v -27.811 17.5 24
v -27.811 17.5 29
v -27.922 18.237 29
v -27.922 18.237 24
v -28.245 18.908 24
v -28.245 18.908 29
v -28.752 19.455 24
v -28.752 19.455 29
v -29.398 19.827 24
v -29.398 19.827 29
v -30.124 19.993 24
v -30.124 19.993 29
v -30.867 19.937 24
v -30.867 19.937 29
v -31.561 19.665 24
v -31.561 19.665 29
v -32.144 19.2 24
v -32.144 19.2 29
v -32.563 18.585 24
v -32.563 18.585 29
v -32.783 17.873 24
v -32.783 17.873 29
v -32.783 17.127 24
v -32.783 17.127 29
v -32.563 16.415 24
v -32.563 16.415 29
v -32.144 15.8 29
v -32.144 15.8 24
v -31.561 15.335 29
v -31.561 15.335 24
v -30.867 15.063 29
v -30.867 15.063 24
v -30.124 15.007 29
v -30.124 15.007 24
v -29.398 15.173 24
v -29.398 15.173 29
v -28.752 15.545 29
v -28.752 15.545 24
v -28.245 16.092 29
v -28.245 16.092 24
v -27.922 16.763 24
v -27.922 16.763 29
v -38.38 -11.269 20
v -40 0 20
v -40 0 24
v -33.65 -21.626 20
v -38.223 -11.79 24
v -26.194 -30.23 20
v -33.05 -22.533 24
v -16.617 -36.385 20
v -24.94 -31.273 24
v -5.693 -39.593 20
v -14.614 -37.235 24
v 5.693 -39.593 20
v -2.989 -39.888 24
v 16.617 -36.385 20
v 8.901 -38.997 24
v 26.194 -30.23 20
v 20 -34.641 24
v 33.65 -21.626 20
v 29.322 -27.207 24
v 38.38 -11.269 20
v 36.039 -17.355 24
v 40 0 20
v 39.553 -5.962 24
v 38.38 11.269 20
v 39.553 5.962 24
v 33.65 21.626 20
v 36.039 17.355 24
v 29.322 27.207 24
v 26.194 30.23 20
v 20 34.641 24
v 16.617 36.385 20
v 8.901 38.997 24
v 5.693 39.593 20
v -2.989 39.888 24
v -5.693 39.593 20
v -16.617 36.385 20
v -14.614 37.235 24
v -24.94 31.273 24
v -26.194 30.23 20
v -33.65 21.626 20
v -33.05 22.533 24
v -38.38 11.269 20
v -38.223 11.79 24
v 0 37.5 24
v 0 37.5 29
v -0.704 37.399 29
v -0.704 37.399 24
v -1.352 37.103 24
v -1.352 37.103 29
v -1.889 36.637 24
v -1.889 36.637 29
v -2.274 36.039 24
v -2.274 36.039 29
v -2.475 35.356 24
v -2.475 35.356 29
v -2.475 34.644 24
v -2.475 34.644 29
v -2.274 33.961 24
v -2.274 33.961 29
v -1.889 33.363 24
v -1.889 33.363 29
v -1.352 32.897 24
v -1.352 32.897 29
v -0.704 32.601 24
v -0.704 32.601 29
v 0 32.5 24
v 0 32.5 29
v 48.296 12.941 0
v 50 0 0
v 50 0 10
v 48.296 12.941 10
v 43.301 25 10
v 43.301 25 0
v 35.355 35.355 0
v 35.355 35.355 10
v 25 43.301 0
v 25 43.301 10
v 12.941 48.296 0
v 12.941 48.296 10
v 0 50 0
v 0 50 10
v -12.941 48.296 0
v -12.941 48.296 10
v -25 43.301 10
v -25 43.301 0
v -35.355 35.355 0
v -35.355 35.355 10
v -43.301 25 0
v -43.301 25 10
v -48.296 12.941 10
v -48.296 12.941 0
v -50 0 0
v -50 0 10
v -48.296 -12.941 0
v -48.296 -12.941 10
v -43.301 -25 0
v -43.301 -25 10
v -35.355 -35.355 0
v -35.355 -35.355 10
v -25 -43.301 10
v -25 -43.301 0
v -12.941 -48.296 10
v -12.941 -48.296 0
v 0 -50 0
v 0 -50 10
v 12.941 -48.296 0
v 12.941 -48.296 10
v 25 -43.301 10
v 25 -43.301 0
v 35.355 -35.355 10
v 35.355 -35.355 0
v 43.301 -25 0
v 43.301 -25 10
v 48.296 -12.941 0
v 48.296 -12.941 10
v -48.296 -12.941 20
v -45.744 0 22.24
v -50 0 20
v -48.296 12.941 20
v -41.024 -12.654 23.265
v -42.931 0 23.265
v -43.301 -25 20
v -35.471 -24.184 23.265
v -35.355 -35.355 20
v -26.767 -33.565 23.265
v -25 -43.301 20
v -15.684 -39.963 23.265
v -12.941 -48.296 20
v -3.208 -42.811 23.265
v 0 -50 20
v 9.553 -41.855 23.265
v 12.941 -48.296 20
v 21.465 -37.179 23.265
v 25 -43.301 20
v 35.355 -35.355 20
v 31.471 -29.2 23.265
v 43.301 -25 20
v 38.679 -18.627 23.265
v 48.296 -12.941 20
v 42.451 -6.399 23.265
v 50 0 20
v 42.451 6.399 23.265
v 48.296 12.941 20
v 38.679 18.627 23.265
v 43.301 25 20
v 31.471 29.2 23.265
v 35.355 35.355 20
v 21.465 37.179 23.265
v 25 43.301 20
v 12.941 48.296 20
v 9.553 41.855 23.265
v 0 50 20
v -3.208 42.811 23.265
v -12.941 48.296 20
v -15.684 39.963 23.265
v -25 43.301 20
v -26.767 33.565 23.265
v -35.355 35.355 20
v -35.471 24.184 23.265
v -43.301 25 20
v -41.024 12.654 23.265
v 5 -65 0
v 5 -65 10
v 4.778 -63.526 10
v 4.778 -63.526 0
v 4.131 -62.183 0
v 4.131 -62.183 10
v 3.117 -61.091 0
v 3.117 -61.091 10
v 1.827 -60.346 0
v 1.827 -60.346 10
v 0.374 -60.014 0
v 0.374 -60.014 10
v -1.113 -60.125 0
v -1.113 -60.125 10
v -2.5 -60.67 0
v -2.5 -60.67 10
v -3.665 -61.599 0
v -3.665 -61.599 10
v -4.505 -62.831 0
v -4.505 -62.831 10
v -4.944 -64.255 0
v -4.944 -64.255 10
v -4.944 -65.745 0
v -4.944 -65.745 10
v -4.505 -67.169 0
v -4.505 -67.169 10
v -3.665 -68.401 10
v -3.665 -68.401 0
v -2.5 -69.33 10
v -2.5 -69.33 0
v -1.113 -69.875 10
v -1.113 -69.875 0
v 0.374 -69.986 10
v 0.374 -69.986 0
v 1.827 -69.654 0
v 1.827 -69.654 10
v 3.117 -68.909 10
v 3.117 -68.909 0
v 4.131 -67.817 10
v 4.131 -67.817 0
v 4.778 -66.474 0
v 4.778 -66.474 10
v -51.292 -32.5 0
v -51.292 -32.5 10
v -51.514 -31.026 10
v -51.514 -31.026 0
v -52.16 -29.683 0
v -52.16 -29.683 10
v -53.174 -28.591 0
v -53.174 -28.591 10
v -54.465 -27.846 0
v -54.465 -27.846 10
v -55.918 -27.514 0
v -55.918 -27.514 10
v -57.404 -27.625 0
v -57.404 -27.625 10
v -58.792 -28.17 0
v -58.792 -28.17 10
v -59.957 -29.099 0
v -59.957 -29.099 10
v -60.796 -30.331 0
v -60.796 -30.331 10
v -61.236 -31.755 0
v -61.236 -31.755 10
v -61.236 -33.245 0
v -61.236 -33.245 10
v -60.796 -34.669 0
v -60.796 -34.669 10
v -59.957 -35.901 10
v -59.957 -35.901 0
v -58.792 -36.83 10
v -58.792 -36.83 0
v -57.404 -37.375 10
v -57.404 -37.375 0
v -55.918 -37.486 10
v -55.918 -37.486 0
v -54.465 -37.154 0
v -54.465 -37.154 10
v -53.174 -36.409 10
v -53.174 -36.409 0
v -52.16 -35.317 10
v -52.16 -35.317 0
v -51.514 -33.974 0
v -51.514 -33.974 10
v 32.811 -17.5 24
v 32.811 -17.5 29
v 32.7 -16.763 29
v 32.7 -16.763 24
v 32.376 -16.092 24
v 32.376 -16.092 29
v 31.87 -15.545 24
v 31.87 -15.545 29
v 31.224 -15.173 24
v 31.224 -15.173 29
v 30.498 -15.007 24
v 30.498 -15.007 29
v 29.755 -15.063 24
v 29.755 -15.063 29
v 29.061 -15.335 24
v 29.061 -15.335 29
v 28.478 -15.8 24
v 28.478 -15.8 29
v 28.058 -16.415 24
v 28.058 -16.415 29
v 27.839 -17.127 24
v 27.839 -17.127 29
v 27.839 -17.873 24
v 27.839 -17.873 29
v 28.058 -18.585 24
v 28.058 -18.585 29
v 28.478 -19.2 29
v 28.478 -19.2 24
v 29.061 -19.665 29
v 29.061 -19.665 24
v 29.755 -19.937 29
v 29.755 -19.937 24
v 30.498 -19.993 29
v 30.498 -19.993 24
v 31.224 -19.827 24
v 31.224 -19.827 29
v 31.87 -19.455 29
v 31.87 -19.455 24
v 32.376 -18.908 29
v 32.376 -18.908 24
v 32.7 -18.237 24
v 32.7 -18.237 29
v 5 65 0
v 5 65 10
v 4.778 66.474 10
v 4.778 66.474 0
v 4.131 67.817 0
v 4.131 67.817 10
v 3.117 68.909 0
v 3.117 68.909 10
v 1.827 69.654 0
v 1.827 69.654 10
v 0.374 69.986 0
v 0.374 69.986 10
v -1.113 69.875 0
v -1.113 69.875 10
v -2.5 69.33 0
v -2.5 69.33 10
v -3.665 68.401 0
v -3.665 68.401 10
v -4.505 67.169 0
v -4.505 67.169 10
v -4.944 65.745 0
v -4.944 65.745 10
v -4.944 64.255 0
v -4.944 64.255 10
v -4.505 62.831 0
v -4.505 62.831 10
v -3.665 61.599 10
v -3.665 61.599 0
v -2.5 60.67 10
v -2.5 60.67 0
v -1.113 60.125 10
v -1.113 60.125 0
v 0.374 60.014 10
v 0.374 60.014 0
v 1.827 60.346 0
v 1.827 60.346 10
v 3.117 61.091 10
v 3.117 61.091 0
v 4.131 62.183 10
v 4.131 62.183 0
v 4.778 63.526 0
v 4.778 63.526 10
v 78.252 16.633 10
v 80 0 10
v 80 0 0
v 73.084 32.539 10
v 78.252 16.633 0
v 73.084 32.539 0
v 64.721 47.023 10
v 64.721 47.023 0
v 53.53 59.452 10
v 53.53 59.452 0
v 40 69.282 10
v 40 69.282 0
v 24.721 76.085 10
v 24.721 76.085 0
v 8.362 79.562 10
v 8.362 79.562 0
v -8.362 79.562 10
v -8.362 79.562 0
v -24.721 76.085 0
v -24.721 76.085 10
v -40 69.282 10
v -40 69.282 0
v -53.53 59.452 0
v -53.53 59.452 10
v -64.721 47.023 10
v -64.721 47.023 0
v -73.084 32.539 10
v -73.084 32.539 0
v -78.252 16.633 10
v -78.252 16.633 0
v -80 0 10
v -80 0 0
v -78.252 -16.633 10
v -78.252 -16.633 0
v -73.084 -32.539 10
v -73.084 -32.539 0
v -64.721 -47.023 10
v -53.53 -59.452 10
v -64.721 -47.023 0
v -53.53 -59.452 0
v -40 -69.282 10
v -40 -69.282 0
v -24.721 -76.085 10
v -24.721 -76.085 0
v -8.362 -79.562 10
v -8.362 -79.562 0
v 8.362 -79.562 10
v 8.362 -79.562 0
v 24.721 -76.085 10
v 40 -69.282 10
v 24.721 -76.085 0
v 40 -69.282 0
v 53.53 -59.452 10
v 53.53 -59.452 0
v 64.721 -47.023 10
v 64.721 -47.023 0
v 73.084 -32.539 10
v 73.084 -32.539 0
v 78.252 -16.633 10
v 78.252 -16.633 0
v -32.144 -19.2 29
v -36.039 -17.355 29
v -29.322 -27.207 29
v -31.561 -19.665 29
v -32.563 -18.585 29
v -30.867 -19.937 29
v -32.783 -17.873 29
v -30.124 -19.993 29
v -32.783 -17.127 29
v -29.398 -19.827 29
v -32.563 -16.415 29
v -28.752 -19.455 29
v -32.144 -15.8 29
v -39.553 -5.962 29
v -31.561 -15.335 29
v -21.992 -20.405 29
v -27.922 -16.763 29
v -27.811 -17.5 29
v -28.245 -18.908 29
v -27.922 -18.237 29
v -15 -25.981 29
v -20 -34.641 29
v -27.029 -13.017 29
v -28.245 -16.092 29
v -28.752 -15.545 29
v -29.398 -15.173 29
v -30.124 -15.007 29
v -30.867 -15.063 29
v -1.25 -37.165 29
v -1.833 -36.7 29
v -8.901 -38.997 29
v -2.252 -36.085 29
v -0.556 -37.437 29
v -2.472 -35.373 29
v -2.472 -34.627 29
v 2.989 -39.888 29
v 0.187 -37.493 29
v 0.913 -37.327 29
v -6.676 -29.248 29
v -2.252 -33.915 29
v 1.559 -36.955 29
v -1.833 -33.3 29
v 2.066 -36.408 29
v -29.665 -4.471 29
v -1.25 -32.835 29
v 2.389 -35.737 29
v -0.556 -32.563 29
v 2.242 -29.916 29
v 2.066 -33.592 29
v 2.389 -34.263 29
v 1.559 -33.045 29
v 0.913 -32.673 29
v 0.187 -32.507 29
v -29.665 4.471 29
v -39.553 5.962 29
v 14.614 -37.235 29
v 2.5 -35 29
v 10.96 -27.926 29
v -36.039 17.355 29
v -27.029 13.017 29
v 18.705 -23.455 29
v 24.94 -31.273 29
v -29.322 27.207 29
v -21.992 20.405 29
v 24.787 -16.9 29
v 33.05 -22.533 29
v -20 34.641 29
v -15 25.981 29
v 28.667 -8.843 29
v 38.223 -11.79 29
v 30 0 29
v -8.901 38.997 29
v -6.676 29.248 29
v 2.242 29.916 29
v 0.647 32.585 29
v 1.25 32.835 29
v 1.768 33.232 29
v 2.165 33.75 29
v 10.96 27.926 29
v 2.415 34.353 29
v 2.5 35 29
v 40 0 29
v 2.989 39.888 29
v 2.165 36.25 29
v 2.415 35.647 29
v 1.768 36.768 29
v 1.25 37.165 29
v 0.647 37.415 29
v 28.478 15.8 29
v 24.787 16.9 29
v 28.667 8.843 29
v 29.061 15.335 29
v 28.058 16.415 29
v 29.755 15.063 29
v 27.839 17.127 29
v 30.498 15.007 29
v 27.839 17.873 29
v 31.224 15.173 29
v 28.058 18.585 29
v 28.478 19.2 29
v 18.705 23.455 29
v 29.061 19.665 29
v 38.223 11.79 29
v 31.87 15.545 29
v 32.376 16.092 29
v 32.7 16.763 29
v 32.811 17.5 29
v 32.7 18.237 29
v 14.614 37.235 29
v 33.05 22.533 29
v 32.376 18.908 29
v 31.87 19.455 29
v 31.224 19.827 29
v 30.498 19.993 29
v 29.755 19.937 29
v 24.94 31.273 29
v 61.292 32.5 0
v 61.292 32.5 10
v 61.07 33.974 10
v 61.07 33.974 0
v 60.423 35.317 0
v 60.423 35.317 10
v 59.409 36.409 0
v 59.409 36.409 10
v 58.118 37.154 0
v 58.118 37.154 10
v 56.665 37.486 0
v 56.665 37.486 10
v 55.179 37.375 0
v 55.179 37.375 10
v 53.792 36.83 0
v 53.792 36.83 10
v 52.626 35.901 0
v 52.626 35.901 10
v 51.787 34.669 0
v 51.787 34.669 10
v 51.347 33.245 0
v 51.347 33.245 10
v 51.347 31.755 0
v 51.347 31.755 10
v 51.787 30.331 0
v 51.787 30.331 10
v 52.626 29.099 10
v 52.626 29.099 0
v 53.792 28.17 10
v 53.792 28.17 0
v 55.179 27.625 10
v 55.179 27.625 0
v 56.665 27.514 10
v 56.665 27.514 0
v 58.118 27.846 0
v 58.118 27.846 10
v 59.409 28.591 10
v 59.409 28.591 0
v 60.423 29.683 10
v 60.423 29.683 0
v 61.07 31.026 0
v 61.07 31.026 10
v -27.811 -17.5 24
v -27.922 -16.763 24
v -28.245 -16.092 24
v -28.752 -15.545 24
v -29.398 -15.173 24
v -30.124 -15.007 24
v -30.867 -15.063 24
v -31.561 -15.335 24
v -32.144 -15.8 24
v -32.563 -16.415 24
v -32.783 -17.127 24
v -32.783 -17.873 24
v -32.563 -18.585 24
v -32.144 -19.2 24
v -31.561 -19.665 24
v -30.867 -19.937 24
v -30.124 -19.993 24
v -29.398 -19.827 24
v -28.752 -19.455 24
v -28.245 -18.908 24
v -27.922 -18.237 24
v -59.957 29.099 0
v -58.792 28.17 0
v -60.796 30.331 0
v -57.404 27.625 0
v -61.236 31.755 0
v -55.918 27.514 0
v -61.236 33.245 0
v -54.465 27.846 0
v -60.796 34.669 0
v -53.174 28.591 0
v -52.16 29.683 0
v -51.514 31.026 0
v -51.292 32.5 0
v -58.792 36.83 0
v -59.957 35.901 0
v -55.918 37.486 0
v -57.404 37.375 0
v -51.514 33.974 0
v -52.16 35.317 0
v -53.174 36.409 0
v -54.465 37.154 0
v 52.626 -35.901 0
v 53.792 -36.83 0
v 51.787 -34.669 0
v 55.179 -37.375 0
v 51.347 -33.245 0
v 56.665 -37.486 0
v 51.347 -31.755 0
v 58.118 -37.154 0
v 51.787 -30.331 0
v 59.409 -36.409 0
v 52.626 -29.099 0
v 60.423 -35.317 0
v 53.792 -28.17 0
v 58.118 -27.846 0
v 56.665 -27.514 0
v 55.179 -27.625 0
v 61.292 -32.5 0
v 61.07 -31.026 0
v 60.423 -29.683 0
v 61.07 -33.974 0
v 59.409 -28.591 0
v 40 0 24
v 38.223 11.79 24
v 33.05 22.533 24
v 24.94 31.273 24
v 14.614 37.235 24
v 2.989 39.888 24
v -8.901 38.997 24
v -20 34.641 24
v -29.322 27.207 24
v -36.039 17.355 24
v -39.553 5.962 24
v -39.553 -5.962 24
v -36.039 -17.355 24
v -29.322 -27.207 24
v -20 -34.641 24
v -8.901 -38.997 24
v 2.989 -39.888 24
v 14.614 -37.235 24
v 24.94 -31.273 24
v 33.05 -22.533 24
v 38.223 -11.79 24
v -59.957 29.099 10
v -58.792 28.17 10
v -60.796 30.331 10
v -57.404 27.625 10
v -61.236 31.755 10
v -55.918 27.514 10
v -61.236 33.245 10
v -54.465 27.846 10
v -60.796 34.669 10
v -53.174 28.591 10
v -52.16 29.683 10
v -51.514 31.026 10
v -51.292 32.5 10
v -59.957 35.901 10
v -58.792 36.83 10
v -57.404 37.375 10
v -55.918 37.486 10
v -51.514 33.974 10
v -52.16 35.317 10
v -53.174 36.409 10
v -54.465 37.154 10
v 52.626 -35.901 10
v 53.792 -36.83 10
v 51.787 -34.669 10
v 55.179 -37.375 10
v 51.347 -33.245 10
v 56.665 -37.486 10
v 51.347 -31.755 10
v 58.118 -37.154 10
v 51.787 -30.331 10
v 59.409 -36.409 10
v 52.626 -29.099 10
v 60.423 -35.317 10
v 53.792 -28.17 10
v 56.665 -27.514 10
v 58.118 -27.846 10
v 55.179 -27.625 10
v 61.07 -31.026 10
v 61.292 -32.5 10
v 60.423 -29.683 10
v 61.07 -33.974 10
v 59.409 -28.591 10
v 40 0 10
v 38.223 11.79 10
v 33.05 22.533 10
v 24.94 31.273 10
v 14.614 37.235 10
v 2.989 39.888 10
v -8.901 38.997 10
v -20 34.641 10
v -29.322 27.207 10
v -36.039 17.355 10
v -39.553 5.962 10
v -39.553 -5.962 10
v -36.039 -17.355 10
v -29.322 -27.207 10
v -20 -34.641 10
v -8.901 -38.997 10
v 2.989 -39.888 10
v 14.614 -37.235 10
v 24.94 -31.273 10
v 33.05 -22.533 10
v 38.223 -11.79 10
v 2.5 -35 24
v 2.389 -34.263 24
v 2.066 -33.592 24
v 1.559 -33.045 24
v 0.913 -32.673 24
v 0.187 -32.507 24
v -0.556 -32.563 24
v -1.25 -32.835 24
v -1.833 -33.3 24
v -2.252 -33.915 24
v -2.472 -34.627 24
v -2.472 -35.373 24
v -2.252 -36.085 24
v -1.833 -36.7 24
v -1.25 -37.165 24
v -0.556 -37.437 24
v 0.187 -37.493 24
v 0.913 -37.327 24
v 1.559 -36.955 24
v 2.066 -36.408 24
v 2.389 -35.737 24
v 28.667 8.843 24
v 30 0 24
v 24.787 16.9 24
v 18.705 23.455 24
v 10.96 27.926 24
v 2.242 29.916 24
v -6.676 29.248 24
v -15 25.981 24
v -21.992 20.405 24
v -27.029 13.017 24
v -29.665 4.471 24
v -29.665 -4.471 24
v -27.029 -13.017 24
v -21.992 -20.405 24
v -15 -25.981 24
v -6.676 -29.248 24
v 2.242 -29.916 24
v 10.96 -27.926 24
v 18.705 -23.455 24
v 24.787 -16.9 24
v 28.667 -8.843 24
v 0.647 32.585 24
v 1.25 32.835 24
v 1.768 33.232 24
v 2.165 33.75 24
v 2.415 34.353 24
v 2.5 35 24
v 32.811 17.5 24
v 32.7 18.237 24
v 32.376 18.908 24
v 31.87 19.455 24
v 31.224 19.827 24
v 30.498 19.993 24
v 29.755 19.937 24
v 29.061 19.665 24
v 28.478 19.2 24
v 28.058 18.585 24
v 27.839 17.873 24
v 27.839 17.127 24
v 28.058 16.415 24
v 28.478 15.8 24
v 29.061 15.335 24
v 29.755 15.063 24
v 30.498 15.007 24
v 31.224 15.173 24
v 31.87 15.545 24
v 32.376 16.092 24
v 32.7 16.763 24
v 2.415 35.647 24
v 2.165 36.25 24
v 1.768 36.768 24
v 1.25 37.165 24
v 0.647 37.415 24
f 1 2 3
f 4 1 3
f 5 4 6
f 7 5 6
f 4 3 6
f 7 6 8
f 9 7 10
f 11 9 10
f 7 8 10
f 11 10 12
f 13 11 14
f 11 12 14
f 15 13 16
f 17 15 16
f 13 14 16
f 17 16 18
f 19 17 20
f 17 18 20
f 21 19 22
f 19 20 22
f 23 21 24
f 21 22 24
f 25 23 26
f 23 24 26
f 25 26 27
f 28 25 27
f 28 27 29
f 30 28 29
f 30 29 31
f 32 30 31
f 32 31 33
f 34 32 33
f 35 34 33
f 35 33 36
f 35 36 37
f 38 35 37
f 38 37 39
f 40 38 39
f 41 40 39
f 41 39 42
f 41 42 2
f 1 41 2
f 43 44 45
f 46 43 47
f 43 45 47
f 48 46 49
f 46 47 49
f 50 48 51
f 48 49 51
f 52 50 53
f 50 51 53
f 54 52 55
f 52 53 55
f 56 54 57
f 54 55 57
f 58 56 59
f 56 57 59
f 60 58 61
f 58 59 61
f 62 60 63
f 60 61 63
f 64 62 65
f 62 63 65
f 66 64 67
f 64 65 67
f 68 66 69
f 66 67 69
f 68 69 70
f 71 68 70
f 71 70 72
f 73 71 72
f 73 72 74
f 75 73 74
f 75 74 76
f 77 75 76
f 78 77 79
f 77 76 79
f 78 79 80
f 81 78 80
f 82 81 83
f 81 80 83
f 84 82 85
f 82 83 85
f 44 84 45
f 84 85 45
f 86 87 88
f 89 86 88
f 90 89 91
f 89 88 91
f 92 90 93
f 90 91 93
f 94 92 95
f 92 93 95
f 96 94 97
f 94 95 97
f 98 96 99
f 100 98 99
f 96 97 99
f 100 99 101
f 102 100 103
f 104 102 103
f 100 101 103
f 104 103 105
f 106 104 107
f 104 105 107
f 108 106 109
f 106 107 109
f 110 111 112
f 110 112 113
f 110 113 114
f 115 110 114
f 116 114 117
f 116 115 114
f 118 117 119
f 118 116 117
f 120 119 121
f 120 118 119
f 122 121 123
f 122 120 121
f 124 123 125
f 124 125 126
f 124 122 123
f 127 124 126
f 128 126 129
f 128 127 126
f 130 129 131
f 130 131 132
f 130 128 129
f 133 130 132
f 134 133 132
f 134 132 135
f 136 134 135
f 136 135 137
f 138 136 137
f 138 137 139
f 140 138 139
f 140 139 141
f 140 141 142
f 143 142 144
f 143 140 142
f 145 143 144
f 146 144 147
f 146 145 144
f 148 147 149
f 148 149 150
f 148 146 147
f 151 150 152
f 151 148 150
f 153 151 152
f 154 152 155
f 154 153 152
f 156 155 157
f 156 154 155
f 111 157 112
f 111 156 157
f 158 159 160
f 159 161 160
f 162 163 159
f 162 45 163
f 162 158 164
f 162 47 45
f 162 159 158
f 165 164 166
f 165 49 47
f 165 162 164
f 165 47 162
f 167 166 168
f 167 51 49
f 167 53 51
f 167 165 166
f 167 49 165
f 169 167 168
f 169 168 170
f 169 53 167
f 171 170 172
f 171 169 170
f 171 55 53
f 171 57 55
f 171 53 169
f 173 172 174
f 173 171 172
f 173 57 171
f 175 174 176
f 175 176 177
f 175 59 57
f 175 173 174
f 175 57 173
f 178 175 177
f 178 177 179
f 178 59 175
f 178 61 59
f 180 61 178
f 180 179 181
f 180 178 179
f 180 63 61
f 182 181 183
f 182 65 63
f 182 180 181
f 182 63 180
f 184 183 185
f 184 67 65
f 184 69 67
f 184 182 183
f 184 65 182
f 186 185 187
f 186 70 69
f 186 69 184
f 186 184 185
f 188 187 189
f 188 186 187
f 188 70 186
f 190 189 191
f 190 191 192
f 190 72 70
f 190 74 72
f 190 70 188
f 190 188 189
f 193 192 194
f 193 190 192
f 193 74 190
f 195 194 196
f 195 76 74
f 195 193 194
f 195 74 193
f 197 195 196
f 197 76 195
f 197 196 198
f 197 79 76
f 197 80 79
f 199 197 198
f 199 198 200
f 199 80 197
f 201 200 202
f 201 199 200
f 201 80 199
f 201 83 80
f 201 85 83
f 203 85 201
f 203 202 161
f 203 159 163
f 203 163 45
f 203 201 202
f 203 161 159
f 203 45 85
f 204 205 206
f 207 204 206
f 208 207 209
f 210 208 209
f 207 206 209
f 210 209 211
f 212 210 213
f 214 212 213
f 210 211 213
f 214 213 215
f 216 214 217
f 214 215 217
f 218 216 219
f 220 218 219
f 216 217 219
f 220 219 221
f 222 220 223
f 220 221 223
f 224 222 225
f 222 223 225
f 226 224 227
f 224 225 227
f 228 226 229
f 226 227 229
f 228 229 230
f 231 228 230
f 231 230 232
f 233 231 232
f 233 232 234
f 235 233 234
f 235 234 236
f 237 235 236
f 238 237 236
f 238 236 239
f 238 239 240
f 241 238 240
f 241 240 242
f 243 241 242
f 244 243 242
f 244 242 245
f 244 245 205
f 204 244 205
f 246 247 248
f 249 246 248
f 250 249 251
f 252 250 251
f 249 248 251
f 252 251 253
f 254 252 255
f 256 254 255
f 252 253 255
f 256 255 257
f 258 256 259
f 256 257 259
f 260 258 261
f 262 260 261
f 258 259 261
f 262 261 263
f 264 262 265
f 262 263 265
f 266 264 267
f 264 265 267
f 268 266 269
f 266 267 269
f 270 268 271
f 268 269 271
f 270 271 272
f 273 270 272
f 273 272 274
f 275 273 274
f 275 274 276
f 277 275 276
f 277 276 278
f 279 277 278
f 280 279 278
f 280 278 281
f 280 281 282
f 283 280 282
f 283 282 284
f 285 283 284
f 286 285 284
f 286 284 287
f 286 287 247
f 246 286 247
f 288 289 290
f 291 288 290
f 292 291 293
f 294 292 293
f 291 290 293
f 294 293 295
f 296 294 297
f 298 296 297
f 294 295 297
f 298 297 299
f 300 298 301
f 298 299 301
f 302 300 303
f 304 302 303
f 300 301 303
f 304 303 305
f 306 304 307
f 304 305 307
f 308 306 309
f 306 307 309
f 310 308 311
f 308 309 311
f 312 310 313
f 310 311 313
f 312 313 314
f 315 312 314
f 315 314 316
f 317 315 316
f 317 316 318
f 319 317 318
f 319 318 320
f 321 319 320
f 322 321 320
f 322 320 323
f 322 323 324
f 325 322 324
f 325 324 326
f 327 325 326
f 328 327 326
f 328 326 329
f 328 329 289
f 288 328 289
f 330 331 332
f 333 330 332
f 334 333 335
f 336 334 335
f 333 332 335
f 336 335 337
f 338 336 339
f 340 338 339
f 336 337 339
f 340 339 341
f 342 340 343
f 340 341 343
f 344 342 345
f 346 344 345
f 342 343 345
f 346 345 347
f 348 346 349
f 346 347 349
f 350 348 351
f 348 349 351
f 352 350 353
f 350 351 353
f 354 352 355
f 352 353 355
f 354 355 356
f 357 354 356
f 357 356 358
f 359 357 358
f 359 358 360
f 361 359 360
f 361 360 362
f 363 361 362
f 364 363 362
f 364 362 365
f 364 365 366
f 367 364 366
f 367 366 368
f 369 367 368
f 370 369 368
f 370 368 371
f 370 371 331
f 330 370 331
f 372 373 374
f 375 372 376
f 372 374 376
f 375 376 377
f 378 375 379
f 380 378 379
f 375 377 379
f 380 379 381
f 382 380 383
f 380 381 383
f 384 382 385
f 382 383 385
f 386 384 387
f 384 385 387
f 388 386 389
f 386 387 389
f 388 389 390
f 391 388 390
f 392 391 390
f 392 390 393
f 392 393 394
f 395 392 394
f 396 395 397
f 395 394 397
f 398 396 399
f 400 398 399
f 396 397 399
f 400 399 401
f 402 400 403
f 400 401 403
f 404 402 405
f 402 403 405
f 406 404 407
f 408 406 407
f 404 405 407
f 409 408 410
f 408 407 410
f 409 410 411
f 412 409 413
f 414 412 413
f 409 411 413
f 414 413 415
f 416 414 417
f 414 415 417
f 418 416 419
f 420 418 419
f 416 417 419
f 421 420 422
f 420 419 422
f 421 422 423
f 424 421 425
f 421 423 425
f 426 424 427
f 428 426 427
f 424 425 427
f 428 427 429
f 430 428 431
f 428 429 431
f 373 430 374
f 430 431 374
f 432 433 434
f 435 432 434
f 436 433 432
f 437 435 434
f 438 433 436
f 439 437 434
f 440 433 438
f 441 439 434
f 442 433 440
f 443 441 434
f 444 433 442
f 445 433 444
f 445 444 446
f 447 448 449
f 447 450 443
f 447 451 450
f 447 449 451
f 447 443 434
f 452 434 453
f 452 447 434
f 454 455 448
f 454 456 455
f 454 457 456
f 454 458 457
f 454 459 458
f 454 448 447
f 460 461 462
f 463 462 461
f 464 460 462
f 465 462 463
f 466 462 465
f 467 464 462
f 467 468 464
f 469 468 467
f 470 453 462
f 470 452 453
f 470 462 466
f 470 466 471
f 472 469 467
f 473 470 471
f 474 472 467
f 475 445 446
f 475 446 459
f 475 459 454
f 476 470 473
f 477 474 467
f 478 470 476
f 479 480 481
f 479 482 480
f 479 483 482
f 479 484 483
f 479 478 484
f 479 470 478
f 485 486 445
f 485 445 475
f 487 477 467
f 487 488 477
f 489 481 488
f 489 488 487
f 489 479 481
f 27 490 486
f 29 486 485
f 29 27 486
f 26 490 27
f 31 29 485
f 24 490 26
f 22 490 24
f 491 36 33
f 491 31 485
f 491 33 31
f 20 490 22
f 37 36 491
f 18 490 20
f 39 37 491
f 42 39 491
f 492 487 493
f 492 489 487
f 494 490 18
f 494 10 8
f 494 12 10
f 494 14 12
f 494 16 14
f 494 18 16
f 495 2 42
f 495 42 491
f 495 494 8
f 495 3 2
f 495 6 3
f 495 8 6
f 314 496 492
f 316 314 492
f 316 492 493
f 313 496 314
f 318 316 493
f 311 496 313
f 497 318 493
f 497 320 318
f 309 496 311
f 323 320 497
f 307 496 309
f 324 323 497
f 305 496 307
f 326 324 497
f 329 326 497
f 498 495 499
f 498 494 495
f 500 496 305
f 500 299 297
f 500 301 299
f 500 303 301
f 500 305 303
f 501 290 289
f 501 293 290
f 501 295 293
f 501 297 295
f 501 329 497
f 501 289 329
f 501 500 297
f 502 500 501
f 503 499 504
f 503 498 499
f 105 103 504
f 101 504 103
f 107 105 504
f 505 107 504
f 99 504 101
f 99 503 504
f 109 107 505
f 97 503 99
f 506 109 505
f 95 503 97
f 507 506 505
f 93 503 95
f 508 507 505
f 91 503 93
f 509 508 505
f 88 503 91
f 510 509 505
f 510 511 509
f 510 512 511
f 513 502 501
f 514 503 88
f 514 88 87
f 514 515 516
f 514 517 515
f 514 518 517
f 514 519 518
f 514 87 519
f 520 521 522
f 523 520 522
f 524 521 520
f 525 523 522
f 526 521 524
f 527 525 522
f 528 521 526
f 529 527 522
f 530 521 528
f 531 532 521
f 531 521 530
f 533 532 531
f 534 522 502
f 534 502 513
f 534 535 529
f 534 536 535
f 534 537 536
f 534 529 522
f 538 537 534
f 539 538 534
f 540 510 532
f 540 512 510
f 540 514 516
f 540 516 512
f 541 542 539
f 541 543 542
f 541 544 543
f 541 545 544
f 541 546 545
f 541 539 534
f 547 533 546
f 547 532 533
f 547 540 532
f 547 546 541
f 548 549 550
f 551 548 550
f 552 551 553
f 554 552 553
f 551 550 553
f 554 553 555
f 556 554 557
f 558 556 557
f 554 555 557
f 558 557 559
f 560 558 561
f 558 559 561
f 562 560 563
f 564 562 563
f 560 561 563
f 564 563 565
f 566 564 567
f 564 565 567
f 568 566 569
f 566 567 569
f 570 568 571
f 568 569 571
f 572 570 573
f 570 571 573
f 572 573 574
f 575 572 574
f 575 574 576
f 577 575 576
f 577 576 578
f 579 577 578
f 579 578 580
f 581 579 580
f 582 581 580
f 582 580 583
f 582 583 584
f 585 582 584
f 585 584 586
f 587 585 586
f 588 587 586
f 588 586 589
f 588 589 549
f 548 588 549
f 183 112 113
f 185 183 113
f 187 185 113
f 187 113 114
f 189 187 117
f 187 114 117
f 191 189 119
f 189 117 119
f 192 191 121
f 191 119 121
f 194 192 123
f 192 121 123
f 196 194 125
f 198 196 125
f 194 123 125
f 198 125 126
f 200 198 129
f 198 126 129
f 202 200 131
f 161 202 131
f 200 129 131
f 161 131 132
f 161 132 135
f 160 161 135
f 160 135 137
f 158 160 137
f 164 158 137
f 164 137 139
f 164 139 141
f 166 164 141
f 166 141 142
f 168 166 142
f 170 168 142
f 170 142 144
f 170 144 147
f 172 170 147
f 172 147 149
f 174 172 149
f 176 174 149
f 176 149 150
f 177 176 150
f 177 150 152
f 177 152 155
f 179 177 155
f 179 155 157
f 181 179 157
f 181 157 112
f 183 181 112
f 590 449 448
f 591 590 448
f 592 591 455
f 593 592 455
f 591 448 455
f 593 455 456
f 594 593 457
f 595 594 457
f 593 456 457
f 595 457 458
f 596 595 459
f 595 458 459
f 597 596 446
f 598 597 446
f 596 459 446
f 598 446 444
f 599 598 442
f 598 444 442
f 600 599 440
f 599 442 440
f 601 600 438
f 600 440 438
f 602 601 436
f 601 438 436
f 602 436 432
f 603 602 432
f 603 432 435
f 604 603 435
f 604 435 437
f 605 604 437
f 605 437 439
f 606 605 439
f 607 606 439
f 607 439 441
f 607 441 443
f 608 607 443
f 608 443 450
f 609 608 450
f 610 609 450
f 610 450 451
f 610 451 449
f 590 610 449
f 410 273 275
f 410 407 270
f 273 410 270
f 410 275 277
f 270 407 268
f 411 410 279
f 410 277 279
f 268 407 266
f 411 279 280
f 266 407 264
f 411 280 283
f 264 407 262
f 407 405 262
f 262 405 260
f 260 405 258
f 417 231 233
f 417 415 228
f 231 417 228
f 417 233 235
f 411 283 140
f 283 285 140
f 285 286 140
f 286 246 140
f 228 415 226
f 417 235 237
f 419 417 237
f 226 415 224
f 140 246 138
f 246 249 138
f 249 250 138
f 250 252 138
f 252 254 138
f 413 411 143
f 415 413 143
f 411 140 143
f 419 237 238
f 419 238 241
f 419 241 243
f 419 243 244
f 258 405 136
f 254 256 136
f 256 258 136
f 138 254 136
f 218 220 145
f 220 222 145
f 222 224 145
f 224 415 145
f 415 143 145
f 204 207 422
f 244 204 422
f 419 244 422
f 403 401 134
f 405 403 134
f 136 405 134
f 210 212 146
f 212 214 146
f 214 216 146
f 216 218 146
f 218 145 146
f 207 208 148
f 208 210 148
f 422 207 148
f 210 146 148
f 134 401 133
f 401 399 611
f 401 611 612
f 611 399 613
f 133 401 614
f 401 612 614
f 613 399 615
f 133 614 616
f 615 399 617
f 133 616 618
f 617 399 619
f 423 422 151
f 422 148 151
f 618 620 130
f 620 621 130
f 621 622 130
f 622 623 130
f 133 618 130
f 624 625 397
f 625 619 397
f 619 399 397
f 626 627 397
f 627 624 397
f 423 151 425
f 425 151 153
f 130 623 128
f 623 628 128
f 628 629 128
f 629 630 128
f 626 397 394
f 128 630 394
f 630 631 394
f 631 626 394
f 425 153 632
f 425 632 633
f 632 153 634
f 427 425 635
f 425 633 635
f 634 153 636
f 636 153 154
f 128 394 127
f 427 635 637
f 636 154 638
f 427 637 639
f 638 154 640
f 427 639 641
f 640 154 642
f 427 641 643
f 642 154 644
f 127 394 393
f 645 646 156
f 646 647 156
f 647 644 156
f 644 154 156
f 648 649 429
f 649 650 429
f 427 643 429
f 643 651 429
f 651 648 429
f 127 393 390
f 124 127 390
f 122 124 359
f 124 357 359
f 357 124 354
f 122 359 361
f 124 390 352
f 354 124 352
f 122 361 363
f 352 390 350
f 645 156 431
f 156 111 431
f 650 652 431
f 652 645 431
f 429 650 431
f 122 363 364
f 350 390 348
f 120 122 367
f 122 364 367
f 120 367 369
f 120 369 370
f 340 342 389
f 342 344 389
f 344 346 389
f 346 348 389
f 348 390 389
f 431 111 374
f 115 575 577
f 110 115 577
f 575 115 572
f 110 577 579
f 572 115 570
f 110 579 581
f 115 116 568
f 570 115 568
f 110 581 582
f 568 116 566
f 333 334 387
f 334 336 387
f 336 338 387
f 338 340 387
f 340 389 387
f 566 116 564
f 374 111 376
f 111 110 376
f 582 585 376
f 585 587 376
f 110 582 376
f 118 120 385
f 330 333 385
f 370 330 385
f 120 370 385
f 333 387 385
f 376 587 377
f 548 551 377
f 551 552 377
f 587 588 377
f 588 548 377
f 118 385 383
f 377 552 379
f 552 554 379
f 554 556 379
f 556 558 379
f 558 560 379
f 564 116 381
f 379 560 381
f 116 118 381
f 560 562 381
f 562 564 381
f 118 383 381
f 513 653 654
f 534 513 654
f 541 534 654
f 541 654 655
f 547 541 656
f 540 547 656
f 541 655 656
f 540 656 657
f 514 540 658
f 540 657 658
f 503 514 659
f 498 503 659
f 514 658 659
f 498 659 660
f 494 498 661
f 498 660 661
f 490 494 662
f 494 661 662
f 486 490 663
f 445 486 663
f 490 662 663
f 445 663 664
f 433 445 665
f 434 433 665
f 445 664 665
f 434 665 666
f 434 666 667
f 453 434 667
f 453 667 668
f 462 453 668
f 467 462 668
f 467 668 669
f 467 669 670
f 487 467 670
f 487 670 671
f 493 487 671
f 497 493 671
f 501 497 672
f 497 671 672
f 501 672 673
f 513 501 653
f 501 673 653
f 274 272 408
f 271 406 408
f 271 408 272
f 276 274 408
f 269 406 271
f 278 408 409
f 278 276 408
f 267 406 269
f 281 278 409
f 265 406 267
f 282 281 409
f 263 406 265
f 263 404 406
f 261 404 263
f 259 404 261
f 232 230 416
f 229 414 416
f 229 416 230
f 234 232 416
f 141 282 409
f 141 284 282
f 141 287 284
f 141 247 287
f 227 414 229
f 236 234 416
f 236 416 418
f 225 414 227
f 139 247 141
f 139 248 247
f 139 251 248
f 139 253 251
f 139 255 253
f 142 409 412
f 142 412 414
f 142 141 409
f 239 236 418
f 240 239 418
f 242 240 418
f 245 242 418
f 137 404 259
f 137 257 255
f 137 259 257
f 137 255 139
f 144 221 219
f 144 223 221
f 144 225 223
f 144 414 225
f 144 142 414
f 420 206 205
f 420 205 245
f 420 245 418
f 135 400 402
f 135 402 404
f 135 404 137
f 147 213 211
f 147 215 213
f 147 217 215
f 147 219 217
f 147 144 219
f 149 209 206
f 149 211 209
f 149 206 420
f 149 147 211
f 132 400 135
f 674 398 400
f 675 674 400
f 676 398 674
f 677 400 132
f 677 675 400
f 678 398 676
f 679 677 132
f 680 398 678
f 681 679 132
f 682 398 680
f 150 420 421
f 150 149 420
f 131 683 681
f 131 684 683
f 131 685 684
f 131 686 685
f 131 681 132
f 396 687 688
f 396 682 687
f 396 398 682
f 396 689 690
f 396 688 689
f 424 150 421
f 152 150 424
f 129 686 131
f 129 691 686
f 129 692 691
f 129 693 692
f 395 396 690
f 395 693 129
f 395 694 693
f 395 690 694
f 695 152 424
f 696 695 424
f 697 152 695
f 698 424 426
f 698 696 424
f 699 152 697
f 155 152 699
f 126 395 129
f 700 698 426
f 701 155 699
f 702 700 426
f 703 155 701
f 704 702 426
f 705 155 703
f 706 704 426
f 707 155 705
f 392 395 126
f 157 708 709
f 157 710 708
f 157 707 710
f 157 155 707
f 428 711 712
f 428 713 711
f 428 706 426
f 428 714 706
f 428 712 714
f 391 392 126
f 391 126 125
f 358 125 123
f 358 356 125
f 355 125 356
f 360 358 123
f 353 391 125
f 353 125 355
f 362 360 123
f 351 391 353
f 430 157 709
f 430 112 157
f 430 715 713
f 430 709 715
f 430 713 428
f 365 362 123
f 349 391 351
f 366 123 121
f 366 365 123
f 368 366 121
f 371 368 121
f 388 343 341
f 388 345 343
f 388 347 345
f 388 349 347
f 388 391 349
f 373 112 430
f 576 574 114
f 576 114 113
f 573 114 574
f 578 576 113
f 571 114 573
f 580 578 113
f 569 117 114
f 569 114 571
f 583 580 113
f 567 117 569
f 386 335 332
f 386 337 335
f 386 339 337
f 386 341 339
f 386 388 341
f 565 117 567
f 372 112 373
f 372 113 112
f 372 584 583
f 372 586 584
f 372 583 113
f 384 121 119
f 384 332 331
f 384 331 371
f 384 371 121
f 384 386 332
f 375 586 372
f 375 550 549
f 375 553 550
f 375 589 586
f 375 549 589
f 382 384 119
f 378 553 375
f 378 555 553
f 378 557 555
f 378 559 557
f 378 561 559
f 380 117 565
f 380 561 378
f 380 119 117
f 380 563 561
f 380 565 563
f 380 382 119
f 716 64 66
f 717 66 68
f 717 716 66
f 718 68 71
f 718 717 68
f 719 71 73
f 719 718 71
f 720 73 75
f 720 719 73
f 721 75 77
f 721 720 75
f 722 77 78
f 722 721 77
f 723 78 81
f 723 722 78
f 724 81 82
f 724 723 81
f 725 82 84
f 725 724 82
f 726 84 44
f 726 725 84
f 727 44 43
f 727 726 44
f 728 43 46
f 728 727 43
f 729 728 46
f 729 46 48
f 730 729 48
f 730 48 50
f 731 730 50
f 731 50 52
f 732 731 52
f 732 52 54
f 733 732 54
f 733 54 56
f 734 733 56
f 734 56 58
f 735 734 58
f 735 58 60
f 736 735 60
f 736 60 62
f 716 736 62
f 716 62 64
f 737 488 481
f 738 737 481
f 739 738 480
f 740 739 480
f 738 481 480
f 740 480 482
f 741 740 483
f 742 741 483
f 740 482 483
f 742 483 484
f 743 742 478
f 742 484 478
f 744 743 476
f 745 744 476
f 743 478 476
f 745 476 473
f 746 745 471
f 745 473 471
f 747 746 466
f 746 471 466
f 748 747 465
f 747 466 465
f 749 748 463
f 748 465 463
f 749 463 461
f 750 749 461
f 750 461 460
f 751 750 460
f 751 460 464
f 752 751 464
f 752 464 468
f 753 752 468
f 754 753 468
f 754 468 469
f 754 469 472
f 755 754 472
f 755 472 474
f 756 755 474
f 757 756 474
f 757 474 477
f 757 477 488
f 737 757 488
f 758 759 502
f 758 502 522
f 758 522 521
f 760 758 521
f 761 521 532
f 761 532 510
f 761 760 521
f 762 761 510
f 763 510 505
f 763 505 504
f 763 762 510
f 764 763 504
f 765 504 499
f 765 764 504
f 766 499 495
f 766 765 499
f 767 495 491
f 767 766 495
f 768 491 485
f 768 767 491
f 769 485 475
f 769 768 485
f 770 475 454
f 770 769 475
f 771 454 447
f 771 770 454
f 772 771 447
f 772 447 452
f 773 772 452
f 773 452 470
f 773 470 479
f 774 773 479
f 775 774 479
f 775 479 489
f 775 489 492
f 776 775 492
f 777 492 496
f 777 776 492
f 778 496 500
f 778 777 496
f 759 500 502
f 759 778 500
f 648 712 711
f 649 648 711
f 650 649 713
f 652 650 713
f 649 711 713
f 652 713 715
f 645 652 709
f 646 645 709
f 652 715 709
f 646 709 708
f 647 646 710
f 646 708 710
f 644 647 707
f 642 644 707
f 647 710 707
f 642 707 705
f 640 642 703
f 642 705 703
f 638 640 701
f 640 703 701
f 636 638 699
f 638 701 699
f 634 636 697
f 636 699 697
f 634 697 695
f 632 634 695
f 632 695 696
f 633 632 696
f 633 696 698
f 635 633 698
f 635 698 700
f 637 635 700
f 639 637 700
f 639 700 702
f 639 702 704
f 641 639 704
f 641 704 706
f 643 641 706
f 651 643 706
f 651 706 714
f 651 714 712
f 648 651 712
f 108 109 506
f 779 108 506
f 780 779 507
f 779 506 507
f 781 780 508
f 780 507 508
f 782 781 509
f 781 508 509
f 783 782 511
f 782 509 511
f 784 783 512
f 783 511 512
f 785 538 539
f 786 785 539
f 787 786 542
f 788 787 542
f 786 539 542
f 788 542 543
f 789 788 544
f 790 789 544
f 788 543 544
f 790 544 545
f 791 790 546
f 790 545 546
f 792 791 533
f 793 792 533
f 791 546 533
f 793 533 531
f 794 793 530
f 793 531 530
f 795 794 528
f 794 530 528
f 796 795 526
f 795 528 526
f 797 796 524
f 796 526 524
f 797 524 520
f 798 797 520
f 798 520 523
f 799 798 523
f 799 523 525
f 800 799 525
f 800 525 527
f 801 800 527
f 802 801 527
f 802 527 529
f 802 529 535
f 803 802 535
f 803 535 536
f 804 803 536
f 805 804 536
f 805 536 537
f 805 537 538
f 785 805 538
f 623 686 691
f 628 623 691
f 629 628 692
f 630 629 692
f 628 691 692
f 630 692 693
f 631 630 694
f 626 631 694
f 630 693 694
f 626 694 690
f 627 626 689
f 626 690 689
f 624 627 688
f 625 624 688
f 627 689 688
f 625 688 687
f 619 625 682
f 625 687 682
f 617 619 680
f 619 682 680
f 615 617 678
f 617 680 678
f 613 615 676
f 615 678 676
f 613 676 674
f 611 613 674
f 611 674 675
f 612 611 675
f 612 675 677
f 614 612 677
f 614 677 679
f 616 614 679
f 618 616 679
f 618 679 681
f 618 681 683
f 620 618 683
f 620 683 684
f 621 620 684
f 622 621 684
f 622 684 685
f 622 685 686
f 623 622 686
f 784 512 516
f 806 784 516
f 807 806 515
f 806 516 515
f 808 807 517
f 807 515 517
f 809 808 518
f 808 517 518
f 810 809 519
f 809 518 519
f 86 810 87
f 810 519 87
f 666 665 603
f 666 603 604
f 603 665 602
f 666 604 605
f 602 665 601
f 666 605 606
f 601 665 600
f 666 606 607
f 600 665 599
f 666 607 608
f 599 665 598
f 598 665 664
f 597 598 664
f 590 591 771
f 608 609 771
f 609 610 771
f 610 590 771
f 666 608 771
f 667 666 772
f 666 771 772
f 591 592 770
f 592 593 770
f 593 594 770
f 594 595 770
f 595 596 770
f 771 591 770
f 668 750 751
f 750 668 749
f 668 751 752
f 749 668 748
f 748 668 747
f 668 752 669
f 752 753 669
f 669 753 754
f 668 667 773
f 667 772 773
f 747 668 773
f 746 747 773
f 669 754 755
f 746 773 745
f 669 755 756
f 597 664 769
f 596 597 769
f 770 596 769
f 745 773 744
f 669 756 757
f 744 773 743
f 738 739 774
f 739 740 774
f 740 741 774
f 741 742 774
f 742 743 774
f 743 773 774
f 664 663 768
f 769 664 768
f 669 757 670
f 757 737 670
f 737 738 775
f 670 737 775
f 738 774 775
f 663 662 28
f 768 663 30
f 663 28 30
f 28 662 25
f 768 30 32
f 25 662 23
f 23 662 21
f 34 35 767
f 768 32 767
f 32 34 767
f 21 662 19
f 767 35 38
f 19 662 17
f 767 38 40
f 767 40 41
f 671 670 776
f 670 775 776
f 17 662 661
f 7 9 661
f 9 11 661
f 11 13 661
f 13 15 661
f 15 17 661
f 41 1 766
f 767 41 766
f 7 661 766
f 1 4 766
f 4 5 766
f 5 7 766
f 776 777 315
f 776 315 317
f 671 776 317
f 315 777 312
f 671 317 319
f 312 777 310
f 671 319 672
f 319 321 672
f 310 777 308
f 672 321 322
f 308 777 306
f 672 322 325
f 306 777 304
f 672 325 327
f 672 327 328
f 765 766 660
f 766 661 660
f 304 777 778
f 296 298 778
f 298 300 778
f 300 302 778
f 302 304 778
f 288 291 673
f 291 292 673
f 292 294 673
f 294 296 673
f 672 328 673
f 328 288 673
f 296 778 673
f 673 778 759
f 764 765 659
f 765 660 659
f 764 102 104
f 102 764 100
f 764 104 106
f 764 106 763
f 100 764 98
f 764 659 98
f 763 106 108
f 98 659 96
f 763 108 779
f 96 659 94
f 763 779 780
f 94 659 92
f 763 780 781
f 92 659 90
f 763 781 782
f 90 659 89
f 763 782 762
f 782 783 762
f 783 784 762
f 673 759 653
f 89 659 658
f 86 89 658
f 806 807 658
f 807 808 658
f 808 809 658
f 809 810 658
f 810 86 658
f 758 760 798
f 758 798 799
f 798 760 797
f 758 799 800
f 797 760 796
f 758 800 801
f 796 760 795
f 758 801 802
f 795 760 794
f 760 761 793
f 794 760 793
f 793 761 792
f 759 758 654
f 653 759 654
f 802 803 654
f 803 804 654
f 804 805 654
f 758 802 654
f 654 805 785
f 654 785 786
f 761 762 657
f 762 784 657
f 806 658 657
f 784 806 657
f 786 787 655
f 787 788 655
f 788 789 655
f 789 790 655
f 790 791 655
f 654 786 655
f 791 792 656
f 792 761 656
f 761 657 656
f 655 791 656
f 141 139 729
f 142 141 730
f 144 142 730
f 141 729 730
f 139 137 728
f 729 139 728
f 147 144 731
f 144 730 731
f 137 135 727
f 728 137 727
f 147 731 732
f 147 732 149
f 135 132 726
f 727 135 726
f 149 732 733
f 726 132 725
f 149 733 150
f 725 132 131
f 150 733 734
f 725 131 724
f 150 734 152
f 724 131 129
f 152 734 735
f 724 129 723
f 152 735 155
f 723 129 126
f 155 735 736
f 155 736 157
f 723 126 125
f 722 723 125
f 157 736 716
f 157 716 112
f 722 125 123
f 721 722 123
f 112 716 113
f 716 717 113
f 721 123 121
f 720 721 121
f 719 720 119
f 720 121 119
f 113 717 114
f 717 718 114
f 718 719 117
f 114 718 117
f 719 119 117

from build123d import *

# Parameters (mm, degrees)
SKETCH1_R           = 80
SKETCH1_R_2         = 50
EXTRUDE_THIN1_DEPTH = 10
SKETCH2_R           = 5
CUT_EXTRUDE1_DEPTH  = 114.578166916
SKETCH3_R           = 50
SKETCH3_R_2         = 40
EXTRUDE_THIN2_DEPTH = 10
SKETCH7_R           = 40
SKETCH7_R_2         = 30
EXTRUDE_THIN3_DEPTH = 5
SKETCH8_R           = 2.5
CUT_EXTRUDE2_DEPTH  = 117.79469166


with BuildPart() as part:
    # Sketch1 → Extrude-Thin1 (new body)
    with BuildSketch(Plane.XY):
        Circle(SKETCH1_R)
        Circle(SKETCH1_R_2, mode=Mode.SUBTRACT)
    extrude(amount=EXTRUDE_THIN1_DEPTH)

    # Sketch2 → Cut-Extrude1 (cut, through all)
    with BuildSketch(Plane.XY.offset(10)):
        with Locations((0, 65)):
            Circle(SKETCH2_R)
        with Locations((56.291651246, 32.5)):
            Circle(SKETCH2_R)
        with Locations((56.291651246, -32.5)):
            Circle(SKETCH2_R)
        with Locations((0, -65)):
            Circle(SKETCH2_R)
        with Locations((-56.291651246, -32.5)):
            Circle(SKETCH2_R)
        with Locations((-56.291651246, 32.5)):
            Circle(SKETCH2_R)
    extrude(amount=-CUT_EXTRUDE1_DEPTH, mode=Mode.SUBTRACT)


with BuildPart() as body_2:
    # Sketch3 → Extrude-Thin2 (new body)
    with BuildSketch(Plane.XY.offset(10)):
        Circle(SKETCH3_R)
        Circle(SKETCH3_R_2, mode=Mode.SUBTRACT)
    extrude(amount=EXTRUDE_THIN2_DEPTH)

    # Sketch4 → Revolve1 (revolve)
    with BuildSketch(Plane(origin=(0, 0, 0), x_dir=(0, 0, -1), z_dir=(1, 0, 0))):
        with BuildLine():
            Line((-24, 40), (-20, 40))
            Line((-20, 40), (-20, 50))
            add(Edge.make_bspline(
                [(-20, 50), (-22.936497208, 45.381576701), (-24, 40)],
                knots=[0, 0, 0, 1, 1, 1], degree=2))
        make_face()
    revolve(axis=Axis((0, 0, 0), (0, 0, 1)))


with BuildPart() as body_3:
    # Sketch7 → Extrude-Thin3 (new body)
    with BuildSketch(Plane.XY.offset(24)):
        Circle(SKETCH7_R)
        Circle(SKETCH7_R_2, mode=Mode.SUBTRACT)
    extrude(amount=EXTRUDE_THIN3_DEPTH)

    # Sketch8 → Cut-Extrude2 (cut, through all)
    with BuildSketch(Plane.XY.offset(29)):
        with Locations((0, 35)):
            Circle(SKETCH8_R)
        with Locations((30.310889132, 17.5)):
            Circle(SKETCH8_R)
        with Locations((30.310889132, -17.5)):
            Circle(SKETCH8_R)
        with Locations((0, -35)):
            Circle(SKETCH8_R)
        with Locations((-30.310889132, -17.5)):
            Circle(SKETCH8_R)
        with Locations((-30.310889132, 17.5)):
            Circle(SKETCH8_R)
    extrude(amount=-CUT_EXTRUDE2_DEPTH, mode=Mode.SUBTRACT)


solid = Compound([part.part, body_2.part, body_3.part])
